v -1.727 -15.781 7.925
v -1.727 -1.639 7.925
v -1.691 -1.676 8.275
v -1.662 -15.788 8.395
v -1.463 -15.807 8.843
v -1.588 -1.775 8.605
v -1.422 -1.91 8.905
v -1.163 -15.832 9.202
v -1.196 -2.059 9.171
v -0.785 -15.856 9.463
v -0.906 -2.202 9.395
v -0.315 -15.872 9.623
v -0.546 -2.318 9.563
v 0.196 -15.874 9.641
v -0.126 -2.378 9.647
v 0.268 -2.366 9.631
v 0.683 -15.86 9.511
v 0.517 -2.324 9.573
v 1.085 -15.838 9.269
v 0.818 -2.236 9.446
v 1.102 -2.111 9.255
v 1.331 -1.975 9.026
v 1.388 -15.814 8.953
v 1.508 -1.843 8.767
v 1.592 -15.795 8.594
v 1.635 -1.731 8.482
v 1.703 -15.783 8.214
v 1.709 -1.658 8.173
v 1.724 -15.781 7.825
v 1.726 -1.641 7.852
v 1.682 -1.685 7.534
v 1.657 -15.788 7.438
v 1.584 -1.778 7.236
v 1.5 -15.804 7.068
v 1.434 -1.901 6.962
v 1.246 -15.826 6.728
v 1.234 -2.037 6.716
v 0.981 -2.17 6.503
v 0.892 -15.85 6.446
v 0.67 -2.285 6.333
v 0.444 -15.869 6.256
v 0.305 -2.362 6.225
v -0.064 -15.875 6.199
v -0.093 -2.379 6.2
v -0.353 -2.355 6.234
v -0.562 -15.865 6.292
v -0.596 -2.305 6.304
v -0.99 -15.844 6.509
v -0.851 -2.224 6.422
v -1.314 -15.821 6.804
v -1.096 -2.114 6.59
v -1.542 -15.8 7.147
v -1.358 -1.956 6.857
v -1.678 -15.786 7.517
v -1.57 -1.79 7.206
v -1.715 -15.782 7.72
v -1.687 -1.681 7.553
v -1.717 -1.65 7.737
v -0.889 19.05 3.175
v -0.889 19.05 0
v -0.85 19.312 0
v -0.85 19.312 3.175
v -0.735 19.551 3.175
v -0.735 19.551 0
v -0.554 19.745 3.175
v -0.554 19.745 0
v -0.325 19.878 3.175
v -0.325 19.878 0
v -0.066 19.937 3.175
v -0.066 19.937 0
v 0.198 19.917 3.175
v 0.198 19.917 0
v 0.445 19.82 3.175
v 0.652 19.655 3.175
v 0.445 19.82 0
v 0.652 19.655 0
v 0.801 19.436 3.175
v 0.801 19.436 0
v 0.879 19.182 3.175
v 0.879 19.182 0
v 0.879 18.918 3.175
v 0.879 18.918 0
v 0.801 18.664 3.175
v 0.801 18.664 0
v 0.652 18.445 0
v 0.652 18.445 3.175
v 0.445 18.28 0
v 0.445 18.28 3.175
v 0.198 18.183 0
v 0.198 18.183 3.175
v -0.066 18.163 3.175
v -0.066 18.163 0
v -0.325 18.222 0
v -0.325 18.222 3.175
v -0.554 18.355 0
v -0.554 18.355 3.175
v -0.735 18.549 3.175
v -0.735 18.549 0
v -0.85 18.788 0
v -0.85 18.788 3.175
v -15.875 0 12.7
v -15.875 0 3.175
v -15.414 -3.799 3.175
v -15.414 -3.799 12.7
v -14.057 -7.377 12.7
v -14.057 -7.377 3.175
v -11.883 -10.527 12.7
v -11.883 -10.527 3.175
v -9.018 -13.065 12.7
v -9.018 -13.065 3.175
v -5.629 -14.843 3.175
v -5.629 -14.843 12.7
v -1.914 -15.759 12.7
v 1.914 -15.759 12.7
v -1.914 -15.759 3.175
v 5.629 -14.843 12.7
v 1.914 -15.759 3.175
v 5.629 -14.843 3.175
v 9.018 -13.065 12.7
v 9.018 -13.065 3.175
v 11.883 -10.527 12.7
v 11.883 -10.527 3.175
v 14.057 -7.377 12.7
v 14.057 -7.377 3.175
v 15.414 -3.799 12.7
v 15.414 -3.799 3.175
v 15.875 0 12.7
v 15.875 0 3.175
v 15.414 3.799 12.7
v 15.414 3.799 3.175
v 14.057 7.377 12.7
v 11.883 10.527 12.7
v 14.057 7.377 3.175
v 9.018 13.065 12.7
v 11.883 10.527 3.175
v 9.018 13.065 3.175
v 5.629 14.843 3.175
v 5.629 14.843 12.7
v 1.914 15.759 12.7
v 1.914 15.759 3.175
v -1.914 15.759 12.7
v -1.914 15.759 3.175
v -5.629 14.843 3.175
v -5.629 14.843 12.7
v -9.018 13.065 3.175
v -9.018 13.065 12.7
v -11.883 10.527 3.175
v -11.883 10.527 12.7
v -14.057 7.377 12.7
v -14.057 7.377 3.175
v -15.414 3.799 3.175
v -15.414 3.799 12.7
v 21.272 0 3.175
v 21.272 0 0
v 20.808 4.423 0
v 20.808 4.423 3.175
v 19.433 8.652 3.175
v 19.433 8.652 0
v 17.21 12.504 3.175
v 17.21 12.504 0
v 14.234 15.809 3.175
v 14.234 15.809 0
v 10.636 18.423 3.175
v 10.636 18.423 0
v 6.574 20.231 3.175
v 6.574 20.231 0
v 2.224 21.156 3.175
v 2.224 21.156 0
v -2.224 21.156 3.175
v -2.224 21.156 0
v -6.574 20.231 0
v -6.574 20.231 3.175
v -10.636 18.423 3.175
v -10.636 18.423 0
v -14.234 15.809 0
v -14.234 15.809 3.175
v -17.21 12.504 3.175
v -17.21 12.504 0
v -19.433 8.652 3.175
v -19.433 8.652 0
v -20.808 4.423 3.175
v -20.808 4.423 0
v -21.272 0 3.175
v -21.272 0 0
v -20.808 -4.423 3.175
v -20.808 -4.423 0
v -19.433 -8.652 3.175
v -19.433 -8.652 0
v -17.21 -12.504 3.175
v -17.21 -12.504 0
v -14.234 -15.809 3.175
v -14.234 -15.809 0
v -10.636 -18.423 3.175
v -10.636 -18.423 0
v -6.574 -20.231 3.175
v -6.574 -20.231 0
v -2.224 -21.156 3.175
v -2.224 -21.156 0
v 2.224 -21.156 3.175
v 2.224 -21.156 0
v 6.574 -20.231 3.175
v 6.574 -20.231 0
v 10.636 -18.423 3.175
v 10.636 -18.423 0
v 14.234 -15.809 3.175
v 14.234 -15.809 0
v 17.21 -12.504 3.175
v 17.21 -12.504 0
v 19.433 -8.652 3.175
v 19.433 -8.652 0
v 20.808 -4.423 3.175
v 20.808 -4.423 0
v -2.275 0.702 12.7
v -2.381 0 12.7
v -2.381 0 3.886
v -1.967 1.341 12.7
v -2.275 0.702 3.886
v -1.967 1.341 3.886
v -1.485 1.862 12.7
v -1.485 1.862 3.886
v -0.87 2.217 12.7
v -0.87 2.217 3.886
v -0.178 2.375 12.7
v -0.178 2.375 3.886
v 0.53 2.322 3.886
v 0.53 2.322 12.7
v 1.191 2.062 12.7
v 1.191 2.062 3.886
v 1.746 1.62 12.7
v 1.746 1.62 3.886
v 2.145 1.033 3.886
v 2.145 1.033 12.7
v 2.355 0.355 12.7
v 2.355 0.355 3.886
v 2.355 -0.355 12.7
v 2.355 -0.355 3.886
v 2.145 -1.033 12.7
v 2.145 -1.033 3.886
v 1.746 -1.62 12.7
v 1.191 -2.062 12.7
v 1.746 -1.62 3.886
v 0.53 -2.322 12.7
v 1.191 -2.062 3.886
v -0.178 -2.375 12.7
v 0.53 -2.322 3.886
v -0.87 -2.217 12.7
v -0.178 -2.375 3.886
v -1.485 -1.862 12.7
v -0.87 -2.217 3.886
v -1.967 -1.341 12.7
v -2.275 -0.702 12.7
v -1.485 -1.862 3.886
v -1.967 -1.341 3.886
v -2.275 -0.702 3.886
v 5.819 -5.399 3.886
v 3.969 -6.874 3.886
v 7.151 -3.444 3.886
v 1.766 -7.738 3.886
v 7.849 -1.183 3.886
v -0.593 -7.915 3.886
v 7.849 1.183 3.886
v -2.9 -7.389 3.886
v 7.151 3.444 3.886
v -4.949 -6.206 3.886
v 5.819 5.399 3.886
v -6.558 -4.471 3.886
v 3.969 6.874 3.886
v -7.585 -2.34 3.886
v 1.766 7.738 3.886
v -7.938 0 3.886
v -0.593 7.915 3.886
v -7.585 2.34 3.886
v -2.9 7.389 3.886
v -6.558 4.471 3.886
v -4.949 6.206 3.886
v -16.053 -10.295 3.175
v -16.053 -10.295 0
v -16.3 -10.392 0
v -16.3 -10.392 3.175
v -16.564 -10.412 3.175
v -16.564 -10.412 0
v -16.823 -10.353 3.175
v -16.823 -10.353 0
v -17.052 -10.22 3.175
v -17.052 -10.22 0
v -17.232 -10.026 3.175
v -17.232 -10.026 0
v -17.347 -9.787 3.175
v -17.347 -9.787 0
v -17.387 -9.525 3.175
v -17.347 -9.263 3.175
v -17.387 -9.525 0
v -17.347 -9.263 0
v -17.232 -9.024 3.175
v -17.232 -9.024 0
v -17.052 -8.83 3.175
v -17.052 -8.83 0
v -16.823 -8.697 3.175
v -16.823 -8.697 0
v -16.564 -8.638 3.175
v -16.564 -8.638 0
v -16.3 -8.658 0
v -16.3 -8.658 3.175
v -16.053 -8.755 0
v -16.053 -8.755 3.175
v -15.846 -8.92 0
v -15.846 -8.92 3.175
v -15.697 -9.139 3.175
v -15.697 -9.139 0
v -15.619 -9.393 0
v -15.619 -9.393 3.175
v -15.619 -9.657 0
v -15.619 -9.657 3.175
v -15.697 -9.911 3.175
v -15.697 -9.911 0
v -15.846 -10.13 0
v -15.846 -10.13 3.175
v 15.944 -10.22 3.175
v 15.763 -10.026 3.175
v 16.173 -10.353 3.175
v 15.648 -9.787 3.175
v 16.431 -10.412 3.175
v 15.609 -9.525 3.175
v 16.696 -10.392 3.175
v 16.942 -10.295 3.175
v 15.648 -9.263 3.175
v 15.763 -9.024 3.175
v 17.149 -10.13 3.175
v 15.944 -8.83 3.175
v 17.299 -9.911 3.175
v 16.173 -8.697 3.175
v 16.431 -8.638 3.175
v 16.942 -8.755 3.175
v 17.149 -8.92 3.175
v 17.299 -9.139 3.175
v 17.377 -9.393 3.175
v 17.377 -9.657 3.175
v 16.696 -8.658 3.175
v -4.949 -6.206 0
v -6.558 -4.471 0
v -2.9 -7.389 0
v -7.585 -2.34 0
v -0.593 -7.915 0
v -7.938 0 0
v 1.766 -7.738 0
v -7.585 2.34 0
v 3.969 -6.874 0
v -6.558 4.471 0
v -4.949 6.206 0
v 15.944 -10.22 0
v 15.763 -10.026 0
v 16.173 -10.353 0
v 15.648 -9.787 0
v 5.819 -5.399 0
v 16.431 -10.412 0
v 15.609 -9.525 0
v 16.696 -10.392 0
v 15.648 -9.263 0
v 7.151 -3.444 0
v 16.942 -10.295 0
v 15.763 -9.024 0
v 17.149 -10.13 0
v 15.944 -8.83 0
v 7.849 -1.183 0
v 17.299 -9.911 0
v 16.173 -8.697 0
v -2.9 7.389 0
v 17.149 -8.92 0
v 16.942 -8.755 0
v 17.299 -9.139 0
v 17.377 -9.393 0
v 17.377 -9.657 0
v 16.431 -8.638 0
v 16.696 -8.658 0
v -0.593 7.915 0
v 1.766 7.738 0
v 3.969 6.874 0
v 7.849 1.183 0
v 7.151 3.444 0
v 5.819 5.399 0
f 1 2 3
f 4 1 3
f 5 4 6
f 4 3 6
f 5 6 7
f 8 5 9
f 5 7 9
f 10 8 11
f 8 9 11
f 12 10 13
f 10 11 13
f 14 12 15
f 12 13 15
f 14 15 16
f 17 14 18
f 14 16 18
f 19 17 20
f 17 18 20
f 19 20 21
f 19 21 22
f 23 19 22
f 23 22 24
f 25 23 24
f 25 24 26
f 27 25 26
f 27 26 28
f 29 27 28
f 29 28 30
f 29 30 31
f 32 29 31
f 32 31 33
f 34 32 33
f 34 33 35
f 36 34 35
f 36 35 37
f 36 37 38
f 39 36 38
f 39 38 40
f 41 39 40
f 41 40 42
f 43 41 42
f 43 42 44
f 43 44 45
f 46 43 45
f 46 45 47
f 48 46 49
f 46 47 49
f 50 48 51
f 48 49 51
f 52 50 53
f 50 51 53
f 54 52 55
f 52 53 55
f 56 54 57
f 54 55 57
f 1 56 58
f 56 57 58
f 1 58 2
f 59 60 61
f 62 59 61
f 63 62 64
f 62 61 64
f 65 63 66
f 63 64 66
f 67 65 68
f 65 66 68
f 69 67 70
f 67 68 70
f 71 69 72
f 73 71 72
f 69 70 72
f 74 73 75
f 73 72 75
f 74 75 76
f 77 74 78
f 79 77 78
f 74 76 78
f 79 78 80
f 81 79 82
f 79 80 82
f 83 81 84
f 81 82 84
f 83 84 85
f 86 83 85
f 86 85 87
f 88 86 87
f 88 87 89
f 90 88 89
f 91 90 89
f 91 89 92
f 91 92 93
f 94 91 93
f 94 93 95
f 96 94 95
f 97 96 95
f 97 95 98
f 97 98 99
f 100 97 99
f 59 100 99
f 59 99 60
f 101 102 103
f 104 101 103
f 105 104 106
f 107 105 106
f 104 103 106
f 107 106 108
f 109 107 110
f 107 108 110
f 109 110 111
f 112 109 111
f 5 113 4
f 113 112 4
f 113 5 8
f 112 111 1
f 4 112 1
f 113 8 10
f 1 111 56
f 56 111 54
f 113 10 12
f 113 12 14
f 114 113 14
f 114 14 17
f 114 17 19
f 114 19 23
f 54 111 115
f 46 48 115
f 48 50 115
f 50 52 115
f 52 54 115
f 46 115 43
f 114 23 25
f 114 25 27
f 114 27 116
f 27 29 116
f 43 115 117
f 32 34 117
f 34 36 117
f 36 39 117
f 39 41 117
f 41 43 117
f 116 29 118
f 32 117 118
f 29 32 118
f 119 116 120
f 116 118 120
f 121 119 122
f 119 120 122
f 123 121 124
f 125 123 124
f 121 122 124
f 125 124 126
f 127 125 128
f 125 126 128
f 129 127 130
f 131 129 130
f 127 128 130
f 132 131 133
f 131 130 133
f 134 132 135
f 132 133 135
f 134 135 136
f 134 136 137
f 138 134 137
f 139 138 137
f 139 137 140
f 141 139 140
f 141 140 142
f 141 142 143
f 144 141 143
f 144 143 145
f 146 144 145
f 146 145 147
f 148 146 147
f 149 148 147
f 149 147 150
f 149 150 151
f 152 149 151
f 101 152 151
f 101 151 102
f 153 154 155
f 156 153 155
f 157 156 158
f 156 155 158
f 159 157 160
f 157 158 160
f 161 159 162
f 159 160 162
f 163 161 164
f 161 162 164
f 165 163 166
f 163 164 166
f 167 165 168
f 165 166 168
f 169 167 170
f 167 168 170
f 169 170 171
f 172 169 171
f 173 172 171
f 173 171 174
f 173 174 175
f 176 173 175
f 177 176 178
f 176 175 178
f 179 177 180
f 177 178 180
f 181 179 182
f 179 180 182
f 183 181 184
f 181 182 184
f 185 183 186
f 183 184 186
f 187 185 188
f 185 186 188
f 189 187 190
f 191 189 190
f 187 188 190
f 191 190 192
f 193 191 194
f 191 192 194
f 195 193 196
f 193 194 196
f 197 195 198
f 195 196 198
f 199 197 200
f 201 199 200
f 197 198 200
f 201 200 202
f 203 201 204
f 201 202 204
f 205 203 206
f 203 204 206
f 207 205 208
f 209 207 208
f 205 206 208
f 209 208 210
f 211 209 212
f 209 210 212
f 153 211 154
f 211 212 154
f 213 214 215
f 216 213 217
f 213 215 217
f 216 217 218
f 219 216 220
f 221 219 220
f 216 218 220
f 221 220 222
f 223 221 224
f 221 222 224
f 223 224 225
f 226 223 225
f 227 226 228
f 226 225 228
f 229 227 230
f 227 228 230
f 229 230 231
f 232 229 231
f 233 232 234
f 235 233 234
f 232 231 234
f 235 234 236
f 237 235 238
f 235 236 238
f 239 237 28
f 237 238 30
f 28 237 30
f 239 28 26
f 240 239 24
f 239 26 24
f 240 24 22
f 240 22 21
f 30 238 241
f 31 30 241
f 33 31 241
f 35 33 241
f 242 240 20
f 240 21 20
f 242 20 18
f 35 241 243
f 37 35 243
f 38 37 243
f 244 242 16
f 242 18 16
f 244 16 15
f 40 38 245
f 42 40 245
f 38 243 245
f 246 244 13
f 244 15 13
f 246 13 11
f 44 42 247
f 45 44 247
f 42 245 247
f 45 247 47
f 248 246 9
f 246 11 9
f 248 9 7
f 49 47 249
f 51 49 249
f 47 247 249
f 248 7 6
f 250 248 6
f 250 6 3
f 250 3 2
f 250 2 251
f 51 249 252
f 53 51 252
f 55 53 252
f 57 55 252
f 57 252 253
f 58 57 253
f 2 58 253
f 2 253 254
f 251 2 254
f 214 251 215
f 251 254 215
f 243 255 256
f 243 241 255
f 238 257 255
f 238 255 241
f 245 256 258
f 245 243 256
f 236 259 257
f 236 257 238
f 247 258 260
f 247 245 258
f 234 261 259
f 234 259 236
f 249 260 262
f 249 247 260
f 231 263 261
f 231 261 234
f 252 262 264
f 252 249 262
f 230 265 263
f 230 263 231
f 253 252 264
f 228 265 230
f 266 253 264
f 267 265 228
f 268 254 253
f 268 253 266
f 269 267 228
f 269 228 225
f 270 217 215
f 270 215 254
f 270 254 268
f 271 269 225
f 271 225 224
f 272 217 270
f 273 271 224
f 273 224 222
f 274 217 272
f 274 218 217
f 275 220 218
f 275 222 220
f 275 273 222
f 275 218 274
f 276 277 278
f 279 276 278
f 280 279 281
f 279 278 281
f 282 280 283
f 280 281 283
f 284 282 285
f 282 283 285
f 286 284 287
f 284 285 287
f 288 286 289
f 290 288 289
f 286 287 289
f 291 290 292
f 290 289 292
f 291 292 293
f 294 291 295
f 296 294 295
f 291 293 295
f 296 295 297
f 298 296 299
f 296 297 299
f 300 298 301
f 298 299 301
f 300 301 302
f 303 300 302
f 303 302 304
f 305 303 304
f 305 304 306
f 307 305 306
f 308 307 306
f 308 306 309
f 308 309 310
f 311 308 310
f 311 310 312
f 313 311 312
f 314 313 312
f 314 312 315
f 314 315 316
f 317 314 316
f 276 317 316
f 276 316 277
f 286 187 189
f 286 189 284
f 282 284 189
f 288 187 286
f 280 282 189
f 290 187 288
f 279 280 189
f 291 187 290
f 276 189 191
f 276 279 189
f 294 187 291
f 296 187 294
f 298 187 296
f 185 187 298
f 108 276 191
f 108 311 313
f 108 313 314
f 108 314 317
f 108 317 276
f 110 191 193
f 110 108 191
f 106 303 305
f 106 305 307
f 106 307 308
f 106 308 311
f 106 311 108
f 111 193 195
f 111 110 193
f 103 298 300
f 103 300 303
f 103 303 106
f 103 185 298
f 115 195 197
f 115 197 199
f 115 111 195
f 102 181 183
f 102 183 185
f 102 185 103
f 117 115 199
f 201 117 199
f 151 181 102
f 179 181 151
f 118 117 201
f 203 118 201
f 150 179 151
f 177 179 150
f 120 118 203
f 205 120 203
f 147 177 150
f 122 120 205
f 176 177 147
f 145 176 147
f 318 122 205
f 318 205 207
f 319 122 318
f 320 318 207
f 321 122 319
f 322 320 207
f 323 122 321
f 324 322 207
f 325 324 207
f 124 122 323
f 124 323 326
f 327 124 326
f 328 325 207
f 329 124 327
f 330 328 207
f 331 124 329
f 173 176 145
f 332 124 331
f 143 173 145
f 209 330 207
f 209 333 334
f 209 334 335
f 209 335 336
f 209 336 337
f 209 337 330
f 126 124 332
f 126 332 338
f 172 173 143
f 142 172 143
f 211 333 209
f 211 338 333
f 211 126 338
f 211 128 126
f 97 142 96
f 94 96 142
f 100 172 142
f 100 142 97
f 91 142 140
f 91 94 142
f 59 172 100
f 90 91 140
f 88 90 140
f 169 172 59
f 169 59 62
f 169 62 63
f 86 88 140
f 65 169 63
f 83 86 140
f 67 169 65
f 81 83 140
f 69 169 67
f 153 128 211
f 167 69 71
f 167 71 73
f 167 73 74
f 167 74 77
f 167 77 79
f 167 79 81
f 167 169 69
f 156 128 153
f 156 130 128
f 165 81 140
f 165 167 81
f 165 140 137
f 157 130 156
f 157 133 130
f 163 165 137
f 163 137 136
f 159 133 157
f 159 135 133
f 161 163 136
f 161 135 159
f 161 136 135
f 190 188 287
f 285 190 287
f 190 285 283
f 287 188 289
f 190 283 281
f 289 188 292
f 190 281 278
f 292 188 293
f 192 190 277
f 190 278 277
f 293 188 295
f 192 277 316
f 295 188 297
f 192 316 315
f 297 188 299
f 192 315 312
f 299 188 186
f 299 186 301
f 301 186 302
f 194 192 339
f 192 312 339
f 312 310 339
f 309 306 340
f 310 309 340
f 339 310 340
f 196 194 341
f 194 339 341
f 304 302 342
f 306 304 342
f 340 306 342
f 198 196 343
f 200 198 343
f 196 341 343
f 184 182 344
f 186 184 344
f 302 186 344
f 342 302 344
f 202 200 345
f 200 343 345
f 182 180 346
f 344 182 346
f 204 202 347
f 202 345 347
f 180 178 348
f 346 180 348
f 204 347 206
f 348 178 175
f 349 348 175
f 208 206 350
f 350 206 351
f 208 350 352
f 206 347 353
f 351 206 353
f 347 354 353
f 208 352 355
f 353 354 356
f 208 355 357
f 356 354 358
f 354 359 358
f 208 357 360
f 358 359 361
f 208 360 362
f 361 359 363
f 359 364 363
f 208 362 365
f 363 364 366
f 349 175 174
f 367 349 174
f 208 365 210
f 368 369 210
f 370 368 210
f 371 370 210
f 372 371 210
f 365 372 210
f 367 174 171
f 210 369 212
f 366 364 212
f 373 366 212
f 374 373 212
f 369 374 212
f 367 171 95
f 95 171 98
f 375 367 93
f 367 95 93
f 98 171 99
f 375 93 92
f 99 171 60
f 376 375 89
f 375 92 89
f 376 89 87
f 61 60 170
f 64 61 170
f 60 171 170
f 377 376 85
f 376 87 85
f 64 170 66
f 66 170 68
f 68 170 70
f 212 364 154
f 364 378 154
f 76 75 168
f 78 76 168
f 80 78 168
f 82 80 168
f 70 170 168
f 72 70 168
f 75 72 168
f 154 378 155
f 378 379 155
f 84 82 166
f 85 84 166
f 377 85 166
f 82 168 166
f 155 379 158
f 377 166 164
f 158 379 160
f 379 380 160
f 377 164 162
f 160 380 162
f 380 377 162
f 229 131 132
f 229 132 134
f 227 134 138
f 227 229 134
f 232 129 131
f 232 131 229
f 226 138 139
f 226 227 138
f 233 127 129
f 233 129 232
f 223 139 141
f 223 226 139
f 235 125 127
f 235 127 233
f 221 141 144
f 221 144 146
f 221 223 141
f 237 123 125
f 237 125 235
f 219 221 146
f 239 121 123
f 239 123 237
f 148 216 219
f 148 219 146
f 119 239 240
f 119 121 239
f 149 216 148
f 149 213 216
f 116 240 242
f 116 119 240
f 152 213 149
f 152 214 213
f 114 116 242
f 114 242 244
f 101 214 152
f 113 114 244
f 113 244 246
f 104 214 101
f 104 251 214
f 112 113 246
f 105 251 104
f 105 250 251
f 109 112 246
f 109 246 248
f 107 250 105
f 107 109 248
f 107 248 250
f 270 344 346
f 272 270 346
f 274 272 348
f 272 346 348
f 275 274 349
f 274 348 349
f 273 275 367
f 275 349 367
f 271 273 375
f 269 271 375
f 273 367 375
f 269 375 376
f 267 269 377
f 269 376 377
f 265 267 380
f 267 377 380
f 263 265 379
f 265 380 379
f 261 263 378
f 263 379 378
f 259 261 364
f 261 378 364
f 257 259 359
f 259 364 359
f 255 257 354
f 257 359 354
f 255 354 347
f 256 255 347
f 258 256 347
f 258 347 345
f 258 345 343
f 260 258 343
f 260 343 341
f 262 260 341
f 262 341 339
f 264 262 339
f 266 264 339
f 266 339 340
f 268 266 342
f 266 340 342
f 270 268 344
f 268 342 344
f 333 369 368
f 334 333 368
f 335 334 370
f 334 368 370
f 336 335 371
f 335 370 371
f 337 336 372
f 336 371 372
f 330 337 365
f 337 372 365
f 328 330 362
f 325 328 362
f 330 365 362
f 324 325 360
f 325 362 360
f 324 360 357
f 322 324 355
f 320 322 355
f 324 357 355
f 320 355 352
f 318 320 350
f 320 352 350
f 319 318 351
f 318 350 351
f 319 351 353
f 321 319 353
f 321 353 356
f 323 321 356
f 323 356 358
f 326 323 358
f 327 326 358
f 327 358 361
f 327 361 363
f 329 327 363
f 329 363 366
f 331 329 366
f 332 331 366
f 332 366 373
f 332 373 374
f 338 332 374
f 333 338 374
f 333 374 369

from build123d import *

# Parameters (mm, degrees)
SKETCH1_R                      = 21.2725
BOSS_EXTRUDE1_DEPTH            = 3.175
SKETCH2_R                      = 15.875
BOSS_EXTRUDE2_DEPTH            = 9.525
F_3_16_0_1875_DIAMETER_HOLE1_D = 4.7625
F_2_56_TAPPED_HOLE3_D          = 1.778
CIRPATTERN1_COUNT              = 3
F_8_32_TAPPED_HOLE1_D          = 3.4544
F_8_32_TAPPED_HOLE1_DEPTH      = 21.2715
F_8_32_TAPPED_HOLE1_TIP        = 1.037806461
SKETCH14_R                     = 7.9375
CUT_EXTRUDE1_DEPTH             = 3.8862


with BuildPart() as part:
    # Sketch1 → Boss-Extrude1 (new body)
    with BuildSketch(Plane.XY):
        Circle(SKETCH1_R)
    extrude(amount=BOSS_EXTRUDE1_DEPTH)

    # Sketch2 → Boss-Extrude2 (add)
    with BuildSketch(Plane.XY.offset(3.175)):
        with Locations(Location((0, 0, 0), (0, 0, 180))):
            Circle(SKETCH2_R)
    extrude(amount=BOSS_EXTRUDE2_DEPTH)

    # 3/16 (0.1875) Diameter Hole1 (through all)
    with Locations(Plane.XY.offset(12.7)):
        with Locations((0, 0)):
            Hole(F_3_16_0_1875_DIAMETER_HOLE1_D / 2)

    # #2-56 Tapped Hole3 (through all)
    with Locations(Plane.XY.offset(3.175)):
        with Locations((0, 19.05)):
            f_2_56_tapped_hole3 = Hole(F_2_56_TAPPED_HOLE3_D / 2)

    # CirPattern1: #2-56 Tapped Hole3 ×3 about axis
    cirpattern1_axis = Axis((0, 0, 0), (0, 0, 1))
    for i in range(1, CIRPATTERN1_COUNT):
        add(f_2_56_tapped_hole3.rotate(cirpattern1_axis, i * 360 / CIRPATTERN1_COUNT), mode=Mode.SUBTRACT)

    # #8-32 Tapped Hole1
    with Locations(Plane.XZ.offset(21.2725)):
        with Locations((0, 7.9248)):
            Hole(F_8_32_TAPPED_HOLE1_D / 2, depth=F_8_32_TAPPED_HOLE1_DEPTH)
            with Locations((0, 0, -(F_8_32_TAPPED_HOLE1_DEPTH + F_8_32_TAPPED_HOLE1_TIP / 2))):  # 118° drill point
                Cone(0, F_8_32_TAPPED_HOLE1_D / 2, F_8_32_TAPPED_HOLE1_TIP, mode=Mode.SUBTRACT)

    # Sketch14 → Cut-Extrude1 (cut)
    with BuildSketch(Plane(origin=(0, 0, 0), x_dir=(-1, 0, 0), z_dir=(0, 0, -1))):
        Circle(SKETCH14_R)
    extrude(amount=-CUT_EXTRUDE1_DEPTH, mode=Mode.SUBTRACT)


solid = part.part
